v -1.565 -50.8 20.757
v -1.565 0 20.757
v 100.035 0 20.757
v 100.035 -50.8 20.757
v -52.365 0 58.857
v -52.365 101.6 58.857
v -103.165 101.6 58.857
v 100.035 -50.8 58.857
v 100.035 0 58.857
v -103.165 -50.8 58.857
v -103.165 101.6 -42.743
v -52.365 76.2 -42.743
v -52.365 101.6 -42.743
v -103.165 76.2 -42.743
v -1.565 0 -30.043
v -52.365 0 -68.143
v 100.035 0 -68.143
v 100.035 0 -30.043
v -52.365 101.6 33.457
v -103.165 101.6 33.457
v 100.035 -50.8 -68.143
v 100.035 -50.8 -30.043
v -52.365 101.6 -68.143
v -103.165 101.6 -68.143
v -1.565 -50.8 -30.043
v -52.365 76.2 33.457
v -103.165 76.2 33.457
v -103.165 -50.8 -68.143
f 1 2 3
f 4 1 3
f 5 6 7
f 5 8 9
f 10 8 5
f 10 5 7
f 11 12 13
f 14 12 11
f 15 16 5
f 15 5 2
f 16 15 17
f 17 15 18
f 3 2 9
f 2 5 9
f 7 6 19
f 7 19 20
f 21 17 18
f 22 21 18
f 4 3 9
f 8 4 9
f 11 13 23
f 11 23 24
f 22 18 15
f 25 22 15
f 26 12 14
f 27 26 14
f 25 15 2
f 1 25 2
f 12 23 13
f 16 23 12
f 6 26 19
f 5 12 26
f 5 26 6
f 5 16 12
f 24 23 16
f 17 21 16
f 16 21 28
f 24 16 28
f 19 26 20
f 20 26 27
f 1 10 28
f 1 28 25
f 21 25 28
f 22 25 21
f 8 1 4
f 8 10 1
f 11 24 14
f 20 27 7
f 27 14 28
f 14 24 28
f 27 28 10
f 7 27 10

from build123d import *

# Parameters (mm, degrees)
F1_DEPTH = 50.8
F2_W     = 50.8
F2_H     = 127
F3_DEPTH = 76.2
F4_W     = 50.8
F4_H     = 25.4
F5_DEPTH = 25.4


with BuildPart() as f1:
    # F0 (on Front) → F1 (new body)
    with BuildSketch(Plane.XZ):
        Polygon((100.034788, 58.857108), (-103.165212, 58.857108), (-103.165212, -68.142892), (100.034788, -68.142892), (100.034788, -30.042892), (-1.565212, -30.042892), (-1.565212, 20.757108), (100.034788, 20.757108), align=None)
    extrude(amount=F1_DEPTH)

    # F2 (on face) → F3 (join)
    with BuildSketch(Plane(origin=(0, 0, 0), x_dir=(-1, 0, 0), z_dir=(0, 1, 0))):
        with Locations((77.765212, -4.642892)):
            Rectangle(F2_W, F2_H)
    extrude(amount=F3_DEPTH)

    # F4 (on face) → F5 (join)
    with BuildSketch(Plane(origin=(0, 76.2, 0), x_dir=(-1, 0, 0), z_dir=(0, 1, 0))):
        with Locations((77.765212, 46.157108)):
            Rectangle(F4_W, F4_H)
        with Locations((77.765212, -55.442892)):
            Rectangle(F4_W, F4_H)
    extrude(amount=F5_DEPTH)


solid = f1.part
